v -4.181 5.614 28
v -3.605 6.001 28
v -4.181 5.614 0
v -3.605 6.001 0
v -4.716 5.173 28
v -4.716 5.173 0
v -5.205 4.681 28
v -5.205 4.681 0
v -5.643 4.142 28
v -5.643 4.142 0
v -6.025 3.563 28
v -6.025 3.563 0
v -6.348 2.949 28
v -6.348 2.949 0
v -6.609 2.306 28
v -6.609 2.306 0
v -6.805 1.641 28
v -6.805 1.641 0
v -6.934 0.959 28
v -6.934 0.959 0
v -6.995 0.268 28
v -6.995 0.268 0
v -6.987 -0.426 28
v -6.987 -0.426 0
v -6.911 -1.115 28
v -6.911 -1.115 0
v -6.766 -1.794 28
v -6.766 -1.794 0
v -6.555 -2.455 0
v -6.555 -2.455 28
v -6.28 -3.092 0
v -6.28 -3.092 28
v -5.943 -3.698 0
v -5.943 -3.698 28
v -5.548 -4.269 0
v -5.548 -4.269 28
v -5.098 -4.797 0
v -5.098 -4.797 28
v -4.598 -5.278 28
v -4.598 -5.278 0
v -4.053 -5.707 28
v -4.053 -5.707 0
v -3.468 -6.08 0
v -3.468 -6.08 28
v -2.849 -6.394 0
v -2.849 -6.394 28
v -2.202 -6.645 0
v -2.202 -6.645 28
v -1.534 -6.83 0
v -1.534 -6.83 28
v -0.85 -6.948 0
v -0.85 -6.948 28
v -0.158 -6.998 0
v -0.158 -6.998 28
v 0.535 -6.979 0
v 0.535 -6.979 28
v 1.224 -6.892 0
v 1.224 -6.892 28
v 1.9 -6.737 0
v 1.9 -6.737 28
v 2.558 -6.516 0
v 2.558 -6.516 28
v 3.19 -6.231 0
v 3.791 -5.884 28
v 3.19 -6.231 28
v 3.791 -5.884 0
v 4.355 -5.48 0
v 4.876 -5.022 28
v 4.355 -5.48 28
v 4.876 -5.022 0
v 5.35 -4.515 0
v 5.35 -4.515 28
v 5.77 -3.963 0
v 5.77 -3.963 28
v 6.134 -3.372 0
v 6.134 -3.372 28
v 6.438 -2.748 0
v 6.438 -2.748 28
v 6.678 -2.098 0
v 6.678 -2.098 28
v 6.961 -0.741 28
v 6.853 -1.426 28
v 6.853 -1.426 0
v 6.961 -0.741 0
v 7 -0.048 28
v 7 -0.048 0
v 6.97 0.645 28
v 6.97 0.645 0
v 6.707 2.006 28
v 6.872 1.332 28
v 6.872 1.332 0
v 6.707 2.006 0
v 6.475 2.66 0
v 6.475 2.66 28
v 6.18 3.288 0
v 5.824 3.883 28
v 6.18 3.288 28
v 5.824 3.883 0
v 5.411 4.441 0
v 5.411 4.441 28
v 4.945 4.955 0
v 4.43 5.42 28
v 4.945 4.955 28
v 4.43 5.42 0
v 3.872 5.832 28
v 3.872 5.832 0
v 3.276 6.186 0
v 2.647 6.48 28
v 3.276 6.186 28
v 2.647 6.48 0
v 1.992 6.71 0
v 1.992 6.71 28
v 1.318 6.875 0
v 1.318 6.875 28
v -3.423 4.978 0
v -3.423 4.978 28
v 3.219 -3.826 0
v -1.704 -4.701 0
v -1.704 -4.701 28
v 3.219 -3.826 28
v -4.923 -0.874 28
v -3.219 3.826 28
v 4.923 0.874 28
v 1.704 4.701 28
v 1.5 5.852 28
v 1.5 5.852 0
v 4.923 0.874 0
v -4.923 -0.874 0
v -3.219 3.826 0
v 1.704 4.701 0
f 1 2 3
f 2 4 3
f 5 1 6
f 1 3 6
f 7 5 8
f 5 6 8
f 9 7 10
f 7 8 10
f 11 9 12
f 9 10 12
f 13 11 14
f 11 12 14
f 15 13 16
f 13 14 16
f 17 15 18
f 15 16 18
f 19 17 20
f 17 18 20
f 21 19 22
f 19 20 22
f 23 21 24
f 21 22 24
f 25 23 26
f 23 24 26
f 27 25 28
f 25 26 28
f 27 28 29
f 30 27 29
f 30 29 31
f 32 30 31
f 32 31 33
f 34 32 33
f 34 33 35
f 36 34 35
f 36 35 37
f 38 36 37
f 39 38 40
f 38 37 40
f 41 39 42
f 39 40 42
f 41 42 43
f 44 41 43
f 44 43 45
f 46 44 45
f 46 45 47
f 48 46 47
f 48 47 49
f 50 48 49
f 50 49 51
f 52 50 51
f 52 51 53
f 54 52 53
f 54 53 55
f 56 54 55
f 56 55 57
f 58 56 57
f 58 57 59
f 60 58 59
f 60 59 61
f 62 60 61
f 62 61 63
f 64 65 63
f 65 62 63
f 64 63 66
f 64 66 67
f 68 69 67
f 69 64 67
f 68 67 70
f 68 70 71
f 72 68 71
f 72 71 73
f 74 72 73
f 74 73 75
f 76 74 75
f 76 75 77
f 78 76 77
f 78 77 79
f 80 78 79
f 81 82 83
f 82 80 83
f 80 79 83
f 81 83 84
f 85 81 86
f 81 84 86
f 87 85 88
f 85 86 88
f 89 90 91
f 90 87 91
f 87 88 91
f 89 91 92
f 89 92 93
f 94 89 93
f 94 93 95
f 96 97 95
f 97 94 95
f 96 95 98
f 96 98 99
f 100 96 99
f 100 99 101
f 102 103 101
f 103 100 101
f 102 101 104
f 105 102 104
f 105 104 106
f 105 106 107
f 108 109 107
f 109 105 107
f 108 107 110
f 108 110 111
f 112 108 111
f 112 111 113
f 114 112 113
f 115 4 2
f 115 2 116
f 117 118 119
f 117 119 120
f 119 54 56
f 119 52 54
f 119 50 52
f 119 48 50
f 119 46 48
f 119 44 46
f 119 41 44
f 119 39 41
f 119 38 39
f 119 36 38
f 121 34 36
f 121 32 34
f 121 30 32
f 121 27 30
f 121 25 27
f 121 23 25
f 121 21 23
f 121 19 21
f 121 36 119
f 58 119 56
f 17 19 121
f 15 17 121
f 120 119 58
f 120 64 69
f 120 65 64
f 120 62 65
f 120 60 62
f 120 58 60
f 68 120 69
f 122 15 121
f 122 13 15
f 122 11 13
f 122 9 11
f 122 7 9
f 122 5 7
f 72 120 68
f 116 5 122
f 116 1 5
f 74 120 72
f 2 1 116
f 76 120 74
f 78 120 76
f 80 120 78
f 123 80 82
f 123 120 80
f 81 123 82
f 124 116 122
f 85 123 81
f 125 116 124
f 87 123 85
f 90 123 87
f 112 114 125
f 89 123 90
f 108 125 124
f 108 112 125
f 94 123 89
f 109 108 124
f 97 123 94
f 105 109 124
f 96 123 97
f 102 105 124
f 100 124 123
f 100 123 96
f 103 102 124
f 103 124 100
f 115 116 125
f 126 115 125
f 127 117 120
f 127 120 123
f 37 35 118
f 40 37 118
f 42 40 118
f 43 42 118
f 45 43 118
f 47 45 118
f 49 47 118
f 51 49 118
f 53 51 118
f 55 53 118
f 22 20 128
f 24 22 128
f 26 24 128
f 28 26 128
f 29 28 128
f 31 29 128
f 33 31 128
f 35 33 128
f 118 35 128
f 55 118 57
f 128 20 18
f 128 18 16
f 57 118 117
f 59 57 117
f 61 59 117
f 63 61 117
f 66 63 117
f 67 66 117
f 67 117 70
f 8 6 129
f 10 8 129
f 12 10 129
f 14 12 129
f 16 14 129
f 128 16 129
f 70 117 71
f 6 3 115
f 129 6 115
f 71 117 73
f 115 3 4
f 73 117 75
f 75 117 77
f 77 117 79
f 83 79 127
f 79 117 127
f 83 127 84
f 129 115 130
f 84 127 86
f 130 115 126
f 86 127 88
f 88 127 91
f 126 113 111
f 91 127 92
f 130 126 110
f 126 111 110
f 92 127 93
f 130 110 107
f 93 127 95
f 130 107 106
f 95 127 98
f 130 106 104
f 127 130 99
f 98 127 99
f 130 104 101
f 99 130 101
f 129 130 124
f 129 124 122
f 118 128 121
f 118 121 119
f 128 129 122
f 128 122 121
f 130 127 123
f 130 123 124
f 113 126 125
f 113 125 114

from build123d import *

# Parameters (mm, degrees)
SZKIC1_R                    = 7
DODANIE_WYCI_GNI_CIE1_DEPTH = 28
WYTNIJ_WYCI_GNI_CIE1_DEPTH  = 30.69848481


with BuildPart() as part:
    # Szkic1 → Dodanie-wyciągnięcie1 (new body)
    with BuildSketch(Plane.XY):
        Circle(SZKIC1_R)
        Polygon((4.922995461, 0.874137115), (1.704472782, 4.700507689), (-3.218522678, 3.826370574), (-4.922995461, -0.874137115), (-1.704472782, -4.700507689), (3.218522678, -3.826370574), align=None, mode=Mode.SUBTRACT)
    extrude(amount=DODANIE_WYCI_GNI_CIE1_DEPTH)

    # Szkic2 → Wytnij-wyciągnięcie1 (cut, through all)
    with BuildSketch(Plane.XY.offset(28)):
        Polygon((-3.423048557, 4.978226449), (1.499946904, 5.852363564), (1.23770577, 7.329262202), (-3.685289691, 6.455125087), align=None)
    extrude(amount=-WYTNIJ_WYCI_GNI_CIE1_DEPTH, mode=Mode.SUBTRACT)


solid = part.part
